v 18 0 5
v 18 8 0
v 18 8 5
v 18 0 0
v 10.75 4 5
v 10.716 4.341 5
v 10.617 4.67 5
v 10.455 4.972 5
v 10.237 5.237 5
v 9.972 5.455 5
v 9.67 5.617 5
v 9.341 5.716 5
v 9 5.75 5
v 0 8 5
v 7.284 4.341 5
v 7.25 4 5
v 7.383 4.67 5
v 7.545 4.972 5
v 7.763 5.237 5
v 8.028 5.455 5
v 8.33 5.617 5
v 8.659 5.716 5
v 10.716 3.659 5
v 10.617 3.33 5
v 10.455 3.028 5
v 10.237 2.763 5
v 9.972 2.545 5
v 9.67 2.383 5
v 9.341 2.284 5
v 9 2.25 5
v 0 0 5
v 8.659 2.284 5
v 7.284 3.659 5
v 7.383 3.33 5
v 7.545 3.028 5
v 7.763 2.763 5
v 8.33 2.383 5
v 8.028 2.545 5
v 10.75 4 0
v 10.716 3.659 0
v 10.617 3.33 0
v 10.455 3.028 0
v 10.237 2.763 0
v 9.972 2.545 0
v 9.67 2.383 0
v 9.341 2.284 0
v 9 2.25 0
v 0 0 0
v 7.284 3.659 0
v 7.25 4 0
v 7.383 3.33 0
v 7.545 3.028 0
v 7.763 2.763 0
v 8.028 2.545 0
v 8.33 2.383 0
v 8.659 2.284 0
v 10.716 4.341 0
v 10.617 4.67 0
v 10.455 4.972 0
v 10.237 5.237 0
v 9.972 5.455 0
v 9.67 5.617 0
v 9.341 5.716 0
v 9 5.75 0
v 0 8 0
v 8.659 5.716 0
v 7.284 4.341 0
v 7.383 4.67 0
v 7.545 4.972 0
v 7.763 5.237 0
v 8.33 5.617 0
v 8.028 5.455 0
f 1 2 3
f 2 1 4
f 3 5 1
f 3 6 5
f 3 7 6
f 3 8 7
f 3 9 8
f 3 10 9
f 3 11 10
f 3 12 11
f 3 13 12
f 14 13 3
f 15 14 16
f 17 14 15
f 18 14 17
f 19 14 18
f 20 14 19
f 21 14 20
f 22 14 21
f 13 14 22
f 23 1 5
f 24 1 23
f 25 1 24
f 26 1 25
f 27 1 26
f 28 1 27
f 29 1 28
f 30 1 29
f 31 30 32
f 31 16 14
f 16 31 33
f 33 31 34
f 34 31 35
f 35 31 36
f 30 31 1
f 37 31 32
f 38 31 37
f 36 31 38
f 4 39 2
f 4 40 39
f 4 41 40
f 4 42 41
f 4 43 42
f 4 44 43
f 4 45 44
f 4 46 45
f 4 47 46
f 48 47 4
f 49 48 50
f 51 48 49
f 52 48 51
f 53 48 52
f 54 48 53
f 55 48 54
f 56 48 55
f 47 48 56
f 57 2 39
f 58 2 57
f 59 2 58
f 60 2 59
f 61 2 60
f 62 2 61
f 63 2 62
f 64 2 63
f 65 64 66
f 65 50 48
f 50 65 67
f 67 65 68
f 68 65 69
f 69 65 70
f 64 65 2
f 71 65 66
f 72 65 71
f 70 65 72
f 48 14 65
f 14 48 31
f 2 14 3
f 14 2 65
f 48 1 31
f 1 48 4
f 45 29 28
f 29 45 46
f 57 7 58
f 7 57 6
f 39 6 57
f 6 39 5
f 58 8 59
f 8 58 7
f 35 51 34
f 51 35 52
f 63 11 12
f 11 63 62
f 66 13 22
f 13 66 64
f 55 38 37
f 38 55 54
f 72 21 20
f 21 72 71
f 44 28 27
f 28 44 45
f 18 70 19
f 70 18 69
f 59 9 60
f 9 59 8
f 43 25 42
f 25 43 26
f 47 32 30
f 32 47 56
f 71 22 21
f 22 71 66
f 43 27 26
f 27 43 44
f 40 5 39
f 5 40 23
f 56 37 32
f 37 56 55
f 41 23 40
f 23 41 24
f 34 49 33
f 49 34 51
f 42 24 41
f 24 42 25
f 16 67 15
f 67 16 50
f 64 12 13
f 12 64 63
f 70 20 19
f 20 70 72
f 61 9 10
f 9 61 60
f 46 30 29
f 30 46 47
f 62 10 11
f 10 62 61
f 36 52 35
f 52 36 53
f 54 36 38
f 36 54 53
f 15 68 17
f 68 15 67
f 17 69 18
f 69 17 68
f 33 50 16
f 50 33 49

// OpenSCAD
$fn = 32;

// ----------------------------------------------------------------------
// Micro pad: drilled pad, 5-20 mm class
// ----------------------------------------------------------------------

// --- parameters (mm) ---
pad_l = 18;               // pad length, X
pad_w = 8;                // pad width, Y
pad_t = 5;                // pad thickness, Z
hole_d = 3.5;             // through hole diameter
fit_tol = 0.1;            // tolerance for press fits, mm
free_tol = 0.3;           // tolerance for clearance fits, mm

difference() {
  cube([pad_l, pad_w, pad_t]);
  translate([pad_l / 2, pad_w / 2, -1])
    cylinder(h = pad_t + 2, d = hole_d);
}
